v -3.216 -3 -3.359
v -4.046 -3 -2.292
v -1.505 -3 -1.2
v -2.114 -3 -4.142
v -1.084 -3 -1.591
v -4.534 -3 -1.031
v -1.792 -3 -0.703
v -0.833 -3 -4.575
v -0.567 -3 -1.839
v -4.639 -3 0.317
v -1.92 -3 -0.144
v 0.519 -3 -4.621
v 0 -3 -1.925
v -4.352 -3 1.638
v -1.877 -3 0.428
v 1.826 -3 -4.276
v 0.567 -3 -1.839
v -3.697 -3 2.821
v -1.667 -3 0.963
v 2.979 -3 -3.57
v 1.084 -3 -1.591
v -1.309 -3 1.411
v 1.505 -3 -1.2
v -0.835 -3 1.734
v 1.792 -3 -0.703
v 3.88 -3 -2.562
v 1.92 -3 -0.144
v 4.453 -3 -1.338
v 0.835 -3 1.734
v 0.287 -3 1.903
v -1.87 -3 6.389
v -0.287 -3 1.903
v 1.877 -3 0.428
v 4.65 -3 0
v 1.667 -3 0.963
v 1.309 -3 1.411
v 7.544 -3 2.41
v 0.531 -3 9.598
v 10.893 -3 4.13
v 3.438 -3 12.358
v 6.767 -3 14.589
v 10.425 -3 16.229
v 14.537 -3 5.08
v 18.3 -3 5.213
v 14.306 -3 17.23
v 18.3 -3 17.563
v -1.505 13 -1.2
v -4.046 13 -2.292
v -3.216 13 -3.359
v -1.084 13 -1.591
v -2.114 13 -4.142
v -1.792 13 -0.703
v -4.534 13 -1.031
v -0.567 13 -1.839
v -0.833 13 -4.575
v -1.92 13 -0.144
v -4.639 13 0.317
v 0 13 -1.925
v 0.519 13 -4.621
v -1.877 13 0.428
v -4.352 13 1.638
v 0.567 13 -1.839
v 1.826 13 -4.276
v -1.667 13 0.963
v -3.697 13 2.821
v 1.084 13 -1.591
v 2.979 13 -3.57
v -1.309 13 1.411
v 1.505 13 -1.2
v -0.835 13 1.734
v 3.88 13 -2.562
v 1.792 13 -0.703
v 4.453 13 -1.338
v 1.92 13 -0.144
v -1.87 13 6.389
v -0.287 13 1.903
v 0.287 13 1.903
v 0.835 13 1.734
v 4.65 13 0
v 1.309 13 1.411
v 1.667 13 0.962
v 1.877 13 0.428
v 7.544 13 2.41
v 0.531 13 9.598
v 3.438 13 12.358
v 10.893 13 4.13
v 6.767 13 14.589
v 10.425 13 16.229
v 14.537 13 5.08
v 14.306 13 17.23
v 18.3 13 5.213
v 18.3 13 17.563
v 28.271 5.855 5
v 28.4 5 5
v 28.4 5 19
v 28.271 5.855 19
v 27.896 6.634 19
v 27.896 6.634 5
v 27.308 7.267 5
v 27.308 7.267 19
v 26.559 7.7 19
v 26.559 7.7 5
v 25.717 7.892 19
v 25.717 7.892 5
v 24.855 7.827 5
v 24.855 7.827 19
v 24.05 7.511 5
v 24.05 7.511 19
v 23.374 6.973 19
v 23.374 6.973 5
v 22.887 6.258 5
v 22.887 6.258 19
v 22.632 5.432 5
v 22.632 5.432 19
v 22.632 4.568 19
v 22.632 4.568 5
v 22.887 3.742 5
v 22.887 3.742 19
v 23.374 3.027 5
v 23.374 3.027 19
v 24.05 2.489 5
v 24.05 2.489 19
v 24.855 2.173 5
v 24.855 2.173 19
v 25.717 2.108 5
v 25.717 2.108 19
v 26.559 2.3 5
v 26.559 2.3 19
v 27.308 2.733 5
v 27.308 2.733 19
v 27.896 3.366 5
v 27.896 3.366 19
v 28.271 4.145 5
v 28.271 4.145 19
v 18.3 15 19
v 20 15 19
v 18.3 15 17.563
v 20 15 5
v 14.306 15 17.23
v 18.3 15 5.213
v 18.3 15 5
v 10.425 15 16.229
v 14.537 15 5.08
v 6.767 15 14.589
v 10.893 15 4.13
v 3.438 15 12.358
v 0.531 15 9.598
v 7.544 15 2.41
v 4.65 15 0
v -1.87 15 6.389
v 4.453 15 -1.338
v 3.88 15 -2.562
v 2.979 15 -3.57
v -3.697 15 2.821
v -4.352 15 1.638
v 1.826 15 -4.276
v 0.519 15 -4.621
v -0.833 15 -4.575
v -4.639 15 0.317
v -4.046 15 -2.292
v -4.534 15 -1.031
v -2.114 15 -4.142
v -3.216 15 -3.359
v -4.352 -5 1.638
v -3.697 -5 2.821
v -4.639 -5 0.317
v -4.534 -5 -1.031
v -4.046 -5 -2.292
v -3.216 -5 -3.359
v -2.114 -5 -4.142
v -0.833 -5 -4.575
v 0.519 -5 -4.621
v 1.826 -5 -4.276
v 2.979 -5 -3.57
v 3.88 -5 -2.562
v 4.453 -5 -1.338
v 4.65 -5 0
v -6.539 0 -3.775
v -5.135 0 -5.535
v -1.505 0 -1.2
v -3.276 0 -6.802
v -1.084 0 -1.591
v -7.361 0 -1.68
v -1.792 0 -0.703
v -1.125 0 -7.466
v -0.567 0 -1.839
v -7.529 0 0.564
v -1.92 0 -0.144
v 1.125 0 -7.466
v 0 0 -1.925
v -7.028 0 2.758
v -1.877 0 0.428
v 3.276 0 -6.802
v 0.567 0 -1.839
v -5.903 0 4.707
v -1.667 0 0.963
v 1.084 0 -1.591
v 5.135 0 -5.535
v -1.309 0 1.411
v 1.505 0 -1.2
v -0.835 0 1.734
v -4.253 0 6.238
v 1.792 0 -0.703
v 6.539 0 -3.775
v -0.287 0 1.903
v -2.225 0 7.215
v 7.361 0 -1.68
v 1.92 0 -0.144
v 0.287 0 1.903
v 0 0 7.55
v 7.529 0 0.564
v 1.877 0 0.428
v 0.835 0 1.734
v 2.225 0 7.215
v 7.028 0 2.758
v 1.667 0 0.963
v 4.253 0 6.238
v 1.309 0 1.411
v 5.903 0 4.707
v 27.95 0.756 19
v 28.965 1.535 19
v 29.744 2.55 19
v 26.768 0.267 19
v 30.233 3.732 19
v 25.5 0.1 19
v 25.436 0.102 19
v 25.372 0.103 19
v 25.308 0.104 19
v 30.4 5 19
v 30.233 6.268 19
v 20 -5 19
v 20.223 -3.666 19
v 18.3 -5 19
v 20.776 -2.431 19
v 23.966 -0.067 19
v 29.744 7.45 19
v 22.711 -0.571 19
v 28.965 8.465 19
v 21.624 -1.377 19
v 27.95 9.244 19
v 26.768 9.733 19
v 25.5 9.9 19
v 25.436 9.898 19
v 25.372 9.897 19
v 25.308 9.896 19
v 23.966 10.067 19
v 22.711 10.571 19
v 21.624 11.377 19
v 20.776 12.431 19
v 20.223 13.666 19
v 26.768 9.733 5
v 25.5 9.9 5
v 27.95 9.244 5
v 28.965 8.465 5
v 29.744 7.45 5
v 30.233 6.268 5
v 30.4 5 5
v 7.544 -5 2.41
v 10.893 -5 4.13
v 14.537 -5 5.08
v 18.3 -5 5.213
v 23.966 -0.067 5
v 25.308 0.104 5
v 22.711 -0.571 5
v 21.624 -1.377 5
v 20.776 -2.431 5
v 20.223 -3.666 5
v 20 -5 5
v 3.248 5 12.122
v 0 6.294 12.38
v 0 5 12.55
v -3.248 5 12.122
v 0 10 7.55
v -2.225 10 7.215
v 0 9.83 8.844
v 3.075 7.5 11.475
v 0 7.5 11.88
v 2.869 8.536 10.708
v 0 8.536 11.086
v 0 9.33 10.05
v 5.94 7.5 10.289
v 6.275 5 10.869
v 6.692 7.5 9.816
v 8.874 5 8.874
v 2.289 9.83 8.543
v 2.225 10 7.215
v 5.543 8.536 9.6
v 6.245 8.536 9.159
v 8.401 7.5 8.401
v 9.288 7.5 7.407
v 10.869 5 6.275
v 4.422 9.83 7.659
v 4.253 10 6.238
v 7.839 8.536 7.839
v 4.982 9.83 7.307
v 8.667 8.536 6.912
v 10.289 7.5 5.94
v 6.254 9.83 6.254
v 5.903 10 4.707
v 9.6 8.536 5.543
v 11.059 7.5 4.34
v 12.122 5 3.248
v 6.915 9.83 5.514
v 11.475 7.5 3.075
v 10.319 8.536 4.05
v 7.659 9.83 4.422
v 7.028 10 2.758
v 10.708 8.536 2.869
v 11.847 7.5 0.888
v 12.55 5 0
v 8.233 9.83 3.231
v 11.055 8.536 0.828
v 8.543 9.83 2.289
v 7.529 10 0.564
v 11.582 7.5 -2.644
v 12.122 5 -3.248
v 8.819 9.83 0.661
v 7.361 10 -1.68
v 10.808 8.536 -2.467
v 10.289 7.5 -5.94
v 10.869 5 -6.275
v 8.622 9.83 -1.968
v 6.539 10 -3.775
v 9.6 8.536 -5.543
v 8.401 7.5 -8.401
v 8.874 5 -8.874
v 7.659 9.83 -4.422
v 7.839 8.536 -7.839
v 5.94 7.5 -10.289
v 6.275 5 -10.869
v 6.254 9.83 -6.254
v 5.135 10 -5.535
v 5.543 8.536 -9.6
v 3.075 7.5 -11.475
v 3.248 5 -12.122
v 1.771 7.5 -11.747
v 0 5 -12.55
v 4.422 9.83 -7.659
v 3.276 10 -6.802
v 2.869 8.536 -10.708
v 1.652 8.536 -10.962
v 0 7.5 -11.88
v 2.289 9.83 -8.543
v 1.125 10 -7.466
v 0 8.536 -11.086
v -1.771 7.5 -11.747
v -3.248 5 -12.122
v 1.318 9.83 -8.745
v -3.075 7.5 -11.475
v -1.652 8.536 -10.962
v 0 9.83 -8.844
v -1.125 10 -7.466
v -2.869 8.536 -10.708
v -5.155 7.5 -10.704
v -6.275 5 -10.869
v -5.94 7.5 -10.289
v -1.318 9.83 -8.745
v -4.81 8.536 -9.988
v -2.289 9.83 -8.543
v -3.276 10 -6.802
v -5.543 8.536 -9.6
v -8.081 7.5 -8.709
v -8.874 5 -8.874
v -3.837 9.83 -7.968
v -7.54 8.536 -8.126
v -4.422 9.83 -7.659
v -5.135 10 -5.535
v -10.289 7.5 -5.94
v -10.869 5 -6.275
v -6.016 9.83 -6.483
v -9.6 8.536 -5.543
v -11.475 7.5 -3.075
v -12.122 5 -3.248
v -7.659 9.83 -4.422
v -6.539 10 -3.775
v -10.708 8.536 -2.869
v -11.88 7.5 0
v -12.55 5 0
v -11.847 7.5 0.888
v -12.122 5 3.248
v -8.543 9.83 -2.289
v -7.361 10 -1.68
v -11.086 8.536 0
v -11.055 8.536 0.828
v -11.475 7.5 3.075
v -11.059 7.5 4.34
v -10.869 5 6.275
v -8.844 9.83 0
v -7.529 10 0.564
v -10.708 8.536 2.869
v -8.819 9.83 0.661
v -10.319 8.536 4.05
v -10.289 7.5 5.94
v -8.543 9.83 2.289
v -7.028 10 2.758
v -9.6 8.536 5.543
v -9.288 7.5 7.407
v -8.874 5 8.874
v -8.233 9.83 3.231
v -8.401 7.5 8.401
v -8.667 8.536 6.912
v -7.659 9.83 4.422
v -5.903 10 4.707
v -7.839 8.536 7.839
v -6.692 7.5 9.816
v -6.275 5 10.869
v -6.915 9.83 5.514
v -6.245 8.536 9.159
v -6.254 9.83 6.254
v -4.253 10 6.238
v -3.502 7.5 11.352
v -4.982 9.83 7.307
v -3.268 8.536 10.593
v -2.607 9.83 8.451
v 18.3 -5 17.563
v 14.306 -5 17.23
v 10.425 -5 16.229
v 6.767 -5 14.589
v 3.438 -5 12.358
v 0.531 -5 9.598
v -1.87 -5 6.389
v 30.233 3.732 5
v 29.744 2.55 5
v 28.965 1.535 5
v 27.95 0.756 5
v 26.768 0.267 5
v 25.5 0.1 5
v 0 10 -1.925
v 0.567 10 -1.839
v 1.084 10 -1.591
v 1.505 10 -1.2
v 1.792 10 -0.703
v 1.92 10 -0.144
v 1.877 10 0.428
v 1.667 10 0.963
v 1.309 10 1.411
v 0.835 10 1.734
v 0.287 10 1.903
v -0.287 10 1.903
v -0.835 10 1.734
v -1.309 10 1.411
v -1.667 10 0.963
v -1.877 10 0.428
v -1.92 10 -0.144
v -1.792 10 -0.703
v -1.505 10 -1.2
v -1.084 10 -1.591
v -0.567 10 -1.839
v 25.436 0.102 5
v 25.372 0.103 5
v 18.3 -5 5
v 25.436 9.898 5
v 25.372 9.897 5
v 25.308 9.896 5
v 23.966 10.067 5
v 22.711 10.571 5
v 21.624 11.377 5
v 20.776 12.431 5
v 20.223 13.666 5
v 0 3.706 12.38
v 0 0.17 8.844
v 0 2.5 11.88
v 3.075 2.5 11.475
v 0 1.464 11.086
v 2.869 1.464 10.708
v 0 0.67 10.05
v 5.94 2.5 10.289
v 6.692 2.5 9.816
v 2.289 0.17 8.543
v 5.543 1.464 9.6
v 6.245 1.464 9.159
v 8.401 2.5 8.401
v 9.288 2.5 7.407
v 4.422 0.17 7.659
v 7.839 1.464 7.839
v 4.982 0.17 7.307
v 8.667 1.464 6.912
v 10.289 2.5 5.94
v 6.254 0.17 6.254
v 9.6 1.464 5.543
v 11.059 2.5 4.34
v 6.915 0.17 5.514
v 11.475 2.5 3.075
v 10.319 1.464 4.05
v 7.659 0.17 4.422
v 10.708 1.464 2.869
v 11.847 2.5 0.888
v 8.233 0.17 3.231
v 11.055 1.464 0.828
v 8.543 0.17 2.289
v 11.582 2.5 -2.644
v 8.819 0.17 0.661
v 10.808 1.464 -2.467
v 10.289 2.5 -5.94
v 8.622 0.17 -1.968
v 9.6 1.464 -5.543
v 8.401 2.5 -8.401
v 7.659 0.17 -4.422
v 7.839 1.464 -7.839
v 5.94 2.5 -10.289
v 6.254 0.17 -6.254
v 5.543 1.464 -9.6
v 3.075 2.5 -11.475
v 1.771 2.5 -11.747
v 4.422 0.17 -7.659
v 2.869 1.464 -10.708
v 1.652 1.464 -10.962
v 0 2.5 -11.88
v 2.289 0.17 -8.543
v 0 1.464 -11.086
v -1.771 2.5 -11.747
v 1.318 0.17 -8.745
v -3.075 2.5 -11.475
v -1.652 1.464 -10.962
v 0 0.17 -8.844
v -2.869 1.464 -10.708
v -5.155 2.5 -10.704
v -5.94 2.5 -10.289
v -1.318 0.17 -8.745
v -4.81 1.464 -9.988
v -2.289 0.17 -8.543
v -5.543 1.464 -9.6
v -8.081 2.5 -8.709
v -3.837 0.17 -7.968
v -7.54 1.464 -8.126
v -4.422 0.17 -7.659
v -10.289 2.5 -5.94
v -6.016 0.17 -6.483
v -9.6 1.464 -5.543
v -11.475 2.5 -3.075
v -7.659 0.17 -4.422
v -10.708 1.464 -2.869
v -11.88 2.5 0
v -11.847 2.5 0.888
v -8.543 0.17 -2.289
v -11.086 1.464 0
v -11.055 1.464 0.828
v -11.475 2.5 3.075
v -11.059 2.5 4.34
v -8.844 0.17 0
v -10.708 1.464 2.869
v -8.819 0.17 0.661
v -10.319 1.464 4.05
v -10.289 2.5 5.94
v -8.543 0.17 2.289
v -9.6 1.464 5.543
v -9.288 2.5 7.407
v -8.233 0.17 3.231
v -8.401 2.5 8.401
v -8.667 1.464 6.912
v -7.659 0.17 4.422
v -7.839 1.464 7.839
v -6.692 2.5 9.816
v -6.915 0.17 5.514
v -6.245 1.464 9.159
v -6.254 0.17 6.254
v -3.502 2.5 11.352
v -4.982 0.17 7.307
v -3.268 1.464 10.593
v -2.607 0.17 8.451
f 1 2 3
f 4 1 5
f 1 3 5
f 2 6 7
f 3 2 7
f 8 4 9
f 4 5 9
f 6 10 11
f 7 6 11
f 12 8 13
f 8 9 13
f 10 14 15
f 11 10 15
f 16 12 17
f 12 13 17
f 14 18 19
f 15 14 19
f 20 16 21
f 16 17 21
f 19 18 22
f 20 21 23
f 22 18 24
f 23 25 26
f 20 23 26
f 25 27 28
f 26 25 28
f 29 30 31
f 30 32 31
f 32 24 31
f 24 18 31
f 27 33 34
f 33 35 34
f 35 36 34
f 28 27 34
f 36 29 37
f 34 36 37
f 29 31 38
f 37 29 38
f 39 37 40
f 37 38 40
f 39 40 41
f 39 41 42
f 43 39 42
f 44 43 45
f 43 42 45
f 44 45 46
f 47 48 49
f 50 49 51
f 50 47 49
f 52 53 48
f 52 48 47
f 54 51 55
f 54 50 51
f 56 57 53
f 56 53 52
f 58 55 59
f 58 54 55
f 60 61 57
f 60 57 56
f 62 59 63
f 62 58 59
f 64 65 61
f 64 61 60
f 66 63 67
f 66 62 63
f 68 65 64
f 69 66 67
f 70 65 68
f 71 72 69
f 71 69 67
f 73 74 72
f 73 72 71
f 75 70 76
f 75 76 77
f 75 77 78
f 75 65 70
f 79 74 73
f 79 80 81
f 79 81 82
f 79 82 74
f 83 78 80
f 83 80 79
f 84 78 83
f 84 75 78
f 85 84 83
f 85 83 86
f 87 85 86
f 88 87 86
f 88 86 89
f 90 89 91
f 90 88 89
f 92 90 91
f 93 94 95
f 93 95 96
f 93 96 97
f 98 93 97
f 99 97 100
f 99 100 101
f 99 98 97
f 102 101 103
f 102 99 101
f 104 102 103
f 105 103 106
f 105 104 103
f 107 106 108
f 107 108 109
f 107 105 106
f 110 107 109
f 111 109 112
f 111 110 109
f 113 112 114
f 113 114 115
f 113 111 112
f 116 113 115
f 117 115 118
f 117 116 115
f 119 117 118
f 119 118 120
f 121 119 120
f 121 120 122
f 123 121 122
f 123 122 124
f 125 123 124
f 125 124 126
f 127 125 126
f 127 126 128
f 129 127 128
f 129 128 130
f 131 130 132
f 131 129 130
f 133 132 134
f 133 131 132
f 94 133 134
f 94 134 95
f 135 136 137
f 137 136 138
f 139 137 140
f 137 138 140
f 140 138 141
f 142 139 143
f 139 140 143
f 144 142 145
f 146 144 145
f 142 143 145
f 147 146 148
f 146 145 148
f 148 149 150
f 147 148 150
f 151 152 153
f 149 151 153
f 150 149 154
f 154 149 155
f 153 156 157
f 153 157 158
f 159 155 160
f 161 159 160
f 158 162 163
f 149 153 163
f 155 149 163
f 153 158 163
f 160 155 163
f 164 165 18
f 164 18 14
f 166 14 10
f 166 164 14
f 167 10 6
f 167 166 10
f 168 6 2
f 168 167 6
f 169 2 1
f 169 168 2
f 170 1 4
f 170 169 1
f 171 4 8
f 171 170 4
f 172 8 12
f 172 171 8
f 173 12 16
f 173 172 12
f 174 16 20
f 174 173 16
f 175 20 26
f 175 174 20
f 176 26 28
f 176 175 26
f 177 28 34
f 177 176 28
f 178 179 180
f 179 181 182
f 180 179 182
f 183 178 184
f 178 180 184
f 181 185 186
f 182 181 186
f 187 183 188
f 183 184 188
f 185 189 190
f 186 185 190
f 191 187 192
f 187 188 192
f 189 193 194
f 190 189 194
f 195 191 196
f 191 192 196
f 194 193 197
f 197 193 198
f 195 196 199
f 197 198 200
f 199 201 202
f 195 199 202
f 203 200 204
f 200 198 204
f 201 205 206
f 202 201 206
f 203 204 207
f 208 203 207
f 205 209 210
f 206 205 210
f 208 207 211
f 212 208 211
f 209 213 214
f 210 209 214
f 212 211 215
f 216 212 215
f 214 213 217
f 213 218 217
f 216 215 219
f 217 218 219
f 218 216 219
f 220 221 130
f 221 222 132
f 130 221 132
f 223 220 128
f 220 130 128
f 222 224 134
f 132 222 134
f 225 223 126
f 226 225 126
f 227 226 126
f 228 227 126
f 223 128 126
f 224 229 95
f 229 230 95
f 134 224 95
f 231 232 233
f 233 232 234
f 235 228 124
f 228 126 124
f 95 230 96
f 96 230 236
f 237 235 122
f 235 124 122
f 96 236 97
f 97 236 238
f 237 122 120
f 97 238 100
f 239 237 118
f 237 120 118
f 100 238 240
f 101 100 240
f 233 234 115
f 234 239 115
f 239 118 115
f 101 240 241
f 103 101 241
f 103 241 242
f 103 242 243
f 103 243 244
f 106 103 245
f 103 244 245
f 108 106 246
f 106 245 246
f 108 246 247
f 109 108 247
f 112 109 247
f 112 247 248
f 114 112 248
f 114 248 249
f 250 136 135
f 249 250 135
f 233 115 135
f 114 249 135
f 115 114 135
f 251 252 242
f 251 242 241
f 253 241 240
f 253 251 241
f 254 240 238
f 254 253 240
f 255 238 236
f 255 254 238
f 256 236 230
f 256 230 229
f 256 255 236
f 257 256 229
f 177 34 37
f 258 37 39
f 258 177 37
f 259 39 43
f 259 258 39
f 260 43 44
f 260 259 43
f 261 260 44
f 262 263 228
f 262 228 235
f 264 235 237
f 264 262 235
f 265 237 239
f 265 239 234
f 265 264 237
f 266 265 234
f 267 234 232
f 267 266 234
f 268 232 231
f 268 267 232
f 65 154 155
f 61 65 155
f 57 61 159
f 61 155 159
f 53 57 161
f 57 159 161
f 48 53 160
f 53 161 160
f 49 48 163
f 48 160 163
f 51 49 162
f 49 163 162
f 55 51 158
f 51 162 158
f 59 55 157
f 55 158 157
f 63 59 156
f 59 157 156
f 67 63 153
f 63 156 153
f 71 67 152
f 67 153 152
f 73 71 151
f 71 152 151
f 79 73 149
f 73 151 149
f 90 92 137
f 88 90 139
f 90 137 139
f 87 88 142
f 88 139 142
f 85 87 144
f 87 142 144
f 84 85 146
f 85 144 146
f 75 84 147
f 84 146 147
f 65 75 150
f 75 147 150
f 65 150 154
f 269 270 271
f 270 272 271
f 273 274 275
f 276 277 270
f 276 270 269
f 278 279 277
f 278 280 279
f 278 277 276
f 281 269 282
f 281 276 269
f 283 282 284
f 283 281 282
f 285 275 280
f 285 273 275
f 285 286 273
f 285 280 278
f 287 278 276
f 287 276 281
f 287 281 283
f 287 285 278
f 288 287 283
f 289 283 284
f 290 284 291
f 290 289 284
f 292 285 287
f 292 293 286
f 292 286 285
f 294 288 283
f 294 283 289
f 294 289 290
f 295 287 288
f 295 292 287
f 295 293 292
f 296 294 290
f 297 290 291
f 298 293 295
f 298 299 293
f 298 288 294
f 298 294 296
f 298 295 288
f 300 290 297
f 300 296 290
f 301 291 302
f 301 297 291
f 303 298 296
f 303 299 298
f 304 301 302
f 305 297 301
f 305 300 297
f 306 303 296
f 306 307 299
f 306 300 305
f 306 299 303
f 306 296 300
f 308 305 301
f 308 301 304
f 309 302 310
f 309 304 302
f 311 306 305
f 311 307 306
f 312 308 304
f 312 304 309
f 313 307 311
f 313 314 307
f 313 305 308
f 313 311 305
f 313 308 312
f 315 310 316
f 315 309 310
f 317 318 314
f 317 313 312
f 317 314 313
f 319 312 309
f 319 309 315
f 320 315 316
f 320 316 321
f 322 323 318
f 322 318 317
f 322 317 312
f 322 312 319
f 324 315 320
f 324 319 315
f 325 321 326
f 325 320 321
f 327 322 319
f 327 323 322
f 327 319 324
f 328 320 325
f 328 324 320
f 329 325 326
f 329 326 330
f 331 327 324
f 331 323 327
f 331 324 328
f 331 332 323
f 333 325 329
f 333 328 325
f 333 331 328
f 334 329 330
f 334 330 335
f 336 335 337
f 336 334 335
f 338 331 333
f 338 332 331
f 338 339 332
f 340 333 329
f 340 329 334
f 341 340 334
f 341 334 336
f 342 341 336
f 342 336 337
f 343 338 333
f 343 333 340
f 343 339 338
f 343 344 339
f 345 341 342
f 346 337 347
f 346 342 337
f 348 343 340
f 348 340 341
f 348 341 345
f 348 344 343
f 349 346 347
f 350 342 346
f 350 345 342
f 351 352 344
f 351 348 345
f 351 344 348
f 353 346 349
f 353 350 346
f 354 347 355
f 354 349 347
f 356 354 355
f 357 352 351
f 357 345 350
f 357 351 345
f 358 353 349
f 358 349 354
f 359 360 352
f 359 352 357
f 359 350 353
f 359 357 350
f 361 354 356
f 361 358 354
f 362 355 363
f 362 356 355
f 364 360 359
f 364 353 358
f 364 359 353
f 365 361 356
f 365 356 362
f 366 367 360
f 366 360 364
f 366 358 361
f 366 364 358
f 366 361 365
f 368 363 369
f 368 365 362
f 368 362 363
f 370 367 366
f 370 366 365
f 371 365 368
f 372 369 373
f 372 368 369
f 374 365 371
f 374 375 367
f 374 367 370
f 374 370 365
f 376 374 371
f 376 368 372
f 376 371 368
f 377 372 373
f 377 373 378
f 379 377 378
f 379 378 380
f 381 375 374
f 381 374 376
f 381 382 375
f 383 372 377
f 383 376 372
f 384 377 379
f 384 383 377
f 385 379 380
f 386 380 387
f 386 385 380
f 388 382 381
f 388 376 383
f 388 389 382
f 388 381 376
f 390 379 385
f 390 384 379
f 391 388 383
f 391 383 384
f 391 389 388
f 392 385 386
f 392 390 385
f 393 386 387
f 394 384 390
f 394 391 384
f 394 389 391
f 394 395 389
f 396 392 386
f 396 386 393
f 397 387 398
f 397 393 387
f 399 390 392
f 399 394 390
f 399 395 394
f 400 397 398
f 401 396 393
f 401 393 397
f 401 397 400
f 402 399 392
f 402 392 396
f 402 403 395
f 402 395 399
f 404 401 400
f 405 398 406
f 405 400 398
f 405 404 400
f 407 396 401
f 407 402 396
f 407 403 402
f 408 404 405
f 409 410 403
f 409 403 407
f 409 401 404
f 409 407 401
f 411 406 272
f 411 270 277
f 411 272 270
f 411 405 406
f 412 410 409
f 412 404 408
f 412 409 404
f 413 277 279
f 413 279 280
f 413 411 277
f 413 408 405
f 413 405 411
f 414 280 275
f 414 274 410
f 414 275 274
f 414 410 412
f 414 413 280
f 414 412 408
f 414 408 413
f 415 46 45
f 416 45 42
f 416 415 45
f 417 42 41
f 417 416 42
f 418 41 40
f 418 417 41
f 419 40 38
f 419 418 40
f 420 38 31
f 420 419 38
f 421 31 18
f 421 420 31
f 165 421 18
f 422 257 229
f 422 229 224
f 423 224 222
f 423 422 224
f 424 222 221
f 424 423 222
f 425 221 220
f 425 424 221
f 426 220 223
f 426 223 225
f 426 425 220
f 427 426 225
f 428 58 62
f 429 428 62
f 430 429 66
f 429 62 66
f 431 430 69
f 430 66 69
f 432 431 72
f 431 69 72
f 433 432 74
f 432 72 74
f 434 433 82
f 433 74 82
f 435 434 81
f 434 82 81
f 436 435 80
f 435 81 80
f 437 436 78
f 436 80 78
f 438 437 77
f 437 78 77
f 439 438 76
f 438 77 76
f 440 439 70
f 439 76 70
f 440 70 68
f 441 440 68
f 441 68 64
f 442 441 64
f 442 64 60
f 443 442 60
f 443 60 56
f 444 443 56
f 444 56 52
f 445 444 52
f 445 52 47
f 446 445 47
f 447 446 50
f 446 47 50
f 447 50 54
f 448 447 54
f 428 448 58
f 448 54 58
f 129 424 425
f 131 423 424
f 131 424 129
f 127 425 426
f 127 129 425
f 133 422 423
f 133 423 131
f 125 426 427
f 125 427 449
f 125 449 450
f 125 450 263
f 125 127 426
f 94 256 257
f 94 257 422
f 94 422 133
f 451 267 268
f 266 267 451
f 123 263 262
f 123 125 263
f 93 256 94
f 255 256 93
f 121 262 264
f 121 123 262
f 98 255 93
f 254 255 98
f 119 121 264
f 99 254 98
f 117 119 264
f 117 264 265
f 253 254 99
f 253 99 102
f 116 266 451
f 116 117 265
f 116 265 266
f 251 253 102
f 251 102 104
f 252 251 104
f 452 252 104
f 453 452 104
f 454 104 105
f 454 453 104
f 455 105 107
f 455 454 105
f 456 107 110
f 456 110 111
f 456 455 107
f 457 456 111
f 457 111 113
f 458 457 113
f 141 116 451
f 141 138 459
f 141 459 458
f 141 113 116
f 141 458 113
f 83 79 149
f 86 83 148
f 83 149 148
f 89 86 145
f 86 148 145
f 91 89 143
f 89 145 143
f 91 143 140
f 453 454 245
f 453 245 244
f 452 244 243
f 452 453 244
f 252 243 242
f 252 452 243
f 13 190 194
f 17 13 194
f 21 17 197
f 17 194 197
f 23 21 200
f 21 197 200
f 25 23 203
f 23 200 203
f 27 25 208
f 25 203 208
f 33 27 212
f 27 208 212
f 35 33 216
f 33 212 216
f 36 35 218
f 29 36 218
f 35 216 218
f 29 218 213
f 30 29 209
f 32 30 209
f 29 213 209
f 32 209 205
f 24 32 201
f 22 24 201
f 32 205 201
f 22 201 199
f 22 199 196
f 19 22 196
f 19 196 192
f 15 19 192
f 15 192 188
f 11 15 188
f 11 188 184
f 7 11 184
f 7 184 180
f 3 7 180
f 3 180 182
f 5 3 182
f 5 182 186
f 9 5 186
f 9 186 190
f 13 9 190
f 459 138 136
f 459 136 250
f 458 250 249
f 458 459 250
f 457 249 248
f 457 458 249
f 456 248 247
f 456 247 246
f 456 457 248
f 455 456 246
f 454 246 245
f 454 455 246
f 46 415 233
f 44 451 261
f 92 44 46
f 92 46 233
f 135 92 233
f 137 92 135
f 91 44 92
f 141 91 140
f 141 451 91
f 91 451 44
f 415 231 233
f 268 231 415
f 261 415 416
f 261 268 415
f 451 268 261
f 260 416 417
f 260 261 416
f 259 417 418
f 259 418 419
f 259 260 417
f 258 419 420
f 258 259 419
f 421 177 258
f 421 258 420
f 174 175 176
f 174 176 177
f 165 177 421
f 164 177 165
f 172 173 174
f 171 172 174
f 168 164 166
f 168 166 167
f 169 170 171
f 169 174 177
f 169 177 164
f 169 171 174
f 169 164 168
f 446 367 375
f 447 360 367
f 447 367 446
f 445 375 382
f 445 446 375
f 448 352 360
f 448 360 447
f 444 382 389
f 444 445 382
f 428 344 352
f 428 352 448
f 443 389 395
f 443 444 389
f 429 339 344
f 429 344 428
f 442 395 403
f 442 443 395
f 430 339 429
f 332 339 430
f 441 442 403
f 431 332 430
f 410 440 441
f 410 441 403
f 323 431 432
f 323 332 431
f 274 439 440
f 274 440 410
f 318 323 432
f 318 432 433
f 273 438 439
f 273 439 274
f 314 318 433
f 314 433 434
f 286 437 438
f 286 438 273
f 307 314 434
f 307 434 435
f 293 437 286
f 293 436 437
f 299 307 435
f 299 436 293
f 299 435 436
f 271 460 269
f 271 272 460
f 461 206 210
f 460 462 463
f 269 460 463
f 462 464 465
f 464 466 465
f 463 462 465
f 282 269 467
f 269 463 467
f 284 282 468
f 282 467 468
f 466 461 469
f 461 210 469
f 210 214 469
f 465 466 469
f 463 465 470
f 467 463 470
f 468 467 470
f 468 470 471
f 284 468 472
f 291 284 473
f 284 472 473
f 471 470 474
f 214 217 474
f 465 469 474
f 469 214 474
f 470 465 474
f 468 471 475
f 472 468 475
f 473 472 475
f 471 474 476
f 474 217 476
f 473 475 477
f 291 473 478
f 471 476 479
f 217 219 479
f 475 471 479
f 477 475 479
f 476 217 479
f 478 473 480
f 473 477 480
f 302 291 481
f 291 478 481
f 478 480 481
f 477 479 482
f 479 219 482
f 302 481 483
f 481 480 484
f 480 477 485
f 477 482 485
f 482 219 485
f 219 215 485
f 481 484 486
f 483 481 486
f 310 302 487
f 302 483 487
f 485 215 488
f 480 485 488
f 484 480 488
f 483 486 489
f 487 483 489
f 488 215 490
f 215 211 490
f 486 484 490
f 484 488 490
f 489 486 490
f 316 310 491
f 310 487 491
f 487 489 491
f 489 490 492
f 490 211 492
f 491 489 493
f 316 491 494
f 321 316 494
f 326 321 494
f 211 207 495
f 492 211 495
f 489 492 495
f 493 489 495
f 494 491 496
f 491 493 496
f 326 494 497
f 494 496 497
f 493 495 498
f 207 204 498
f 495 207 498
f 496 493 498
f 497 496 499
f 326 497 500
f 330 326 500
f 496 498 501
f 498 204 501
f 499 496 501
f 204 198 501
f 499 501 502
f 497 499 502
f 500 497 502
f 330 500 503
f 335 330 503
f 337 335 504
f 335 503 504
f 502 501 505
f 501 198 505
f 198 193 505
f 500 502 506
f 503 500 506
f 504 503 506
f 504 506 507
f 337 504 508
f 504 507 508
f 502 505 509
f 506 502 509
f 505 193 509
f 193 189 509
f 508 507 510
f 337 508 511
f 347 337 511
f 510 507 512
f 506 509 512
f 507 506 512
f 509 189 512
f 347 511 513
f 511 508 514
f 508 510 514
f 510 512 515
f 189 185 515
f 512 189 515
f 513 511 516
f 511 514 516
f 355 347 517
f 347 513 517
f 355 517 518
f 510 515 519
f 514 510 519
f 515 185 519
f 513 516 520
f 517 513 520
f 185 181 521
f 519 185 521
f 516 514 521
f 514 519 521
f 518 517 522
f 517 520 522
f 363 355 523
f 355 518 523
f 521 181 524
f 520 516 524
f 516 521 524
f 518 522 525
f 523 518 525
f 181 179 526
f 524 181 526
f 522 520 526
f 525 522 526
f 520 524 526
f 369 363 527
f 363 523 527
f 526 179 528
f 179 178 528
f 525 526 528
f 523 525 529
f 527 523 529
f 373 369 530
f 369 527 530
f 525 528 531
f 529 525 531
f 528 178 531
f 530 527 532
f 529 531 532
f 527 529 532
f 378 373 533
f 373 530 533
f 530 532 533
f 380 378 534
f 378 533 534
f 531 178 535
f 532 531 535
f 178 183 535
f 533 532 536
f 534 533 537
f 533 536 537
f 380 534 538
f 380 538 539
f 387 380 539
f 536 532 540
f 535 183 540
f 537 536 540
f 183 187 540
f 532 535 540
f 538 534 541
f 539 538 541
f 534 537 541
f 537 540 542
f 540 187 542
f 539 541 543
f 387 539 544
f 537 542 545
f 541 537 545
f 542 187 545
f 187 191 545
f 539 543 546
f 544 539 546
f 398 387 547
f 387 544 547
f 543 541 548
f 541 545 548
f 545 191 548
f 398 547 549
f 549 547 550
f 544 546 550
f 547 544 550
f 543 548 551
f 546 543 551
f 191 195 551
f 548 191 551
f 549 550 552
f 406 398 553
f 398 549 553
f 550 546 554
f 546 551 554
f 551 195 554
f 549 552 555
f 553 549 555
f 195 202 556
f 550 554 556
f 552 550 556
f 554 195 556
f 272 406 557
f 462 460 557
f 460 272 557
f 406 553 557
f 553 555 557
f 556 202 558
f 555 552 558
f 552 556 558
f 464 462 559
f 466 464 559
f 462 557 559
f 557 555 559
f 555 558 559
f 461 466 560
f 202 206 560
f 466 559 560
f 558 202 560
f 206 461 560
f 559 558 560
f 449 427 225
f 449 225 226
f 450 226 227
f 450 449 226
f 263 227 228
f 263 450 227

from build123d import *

# Parameters (mm, degrees)
SKETCH1_R                = 12.55
SKETCH1_R_2              = 1.925
BOSS_EXTRUDE1_DEPTH      = 10
FILLET1_R                = 5
BOSS_EXTRUDE2_DEPTH      = 5
BOSS_EXTRUDE2_DEPTH_BACK = 15
SKETCH2_R                = 1.925
SKETCH3_R                = 1.925
BOSS_EXTRUDE3_DEPTH      = 2
BOSS_EXTRUDE4_START      = -20
BOSS_EXTRUDE4_OUTLINE_R  = 1.925
BOSS_EXTRUDE4_DEPTH      = 2
SKETCH4_W                = 12.5
SKETCH4_H                = 20
BOSS_EXTRUDE5_DEPTH      = 1.7
SKETCH5_W                = 1.7
SKETCH5_H                = 10
BOSS_EXTRUDE6_DEPTH      = 14


# Read off the part's stored shape, not the designer's step: Boss-Extrude4
with BuildPart() as part:
    # Sketch1 → Boss-Extrude1 (new body)
    with BuildSketch(Plane(origin=(0, 0, 0), x_dir=(1, 0, 0), z_dir=(0, 1, 0))):
        with Locations(Location((0, 0, 0), (0, 0, 270))):
            Circle(SKETCH1_R)
        with Locations(Location((0, 0, 0), (0, 0, 270))):
            Circle(SKETCH1_R_2, mode=Mode.SUBTRACT)
    extrude(amount=BOSS_EXTRUDE1_DEPTH)

    # Fillet1
    fillet1_edges = [part.edges().sort_by_distance(p)[0] for p in [
        (0, 0, -12.55),
        (0, 10, -12.55),
    ]]
    fillet(fillet1_edges, radius=FILLET1_R - 0.0001)  # a hair under: the kernel refuses the full size

    # Sketch2 → Boss-Extrude2 (add, two sides: drawn at the far end of the back side and taken through both)
    with BuildSketch(Plane.XZ.offset(-BOSS_EXTRUDE2_DEPTH_BACK)):
        with Locations(Location((0, 0, 0), (0, 0, 270))):
            Circle(SKETCH2_R)
    extrude(amount=BOSS_EXTRUDE2_DEPTH + BOSS_EXTRUDE2_DEPTH_BACK)

    # Sketch3 → Boss-Extrude3 (add)
    with BuildSketch(Plane.XZ.offset(5)):
        with BuildLine():
            Line((20, 5), (20, 17.5))
            ThreePointArc((20, 17.5), (5.770309443, 14.004874621), (-3.696538076, 2.821011566))
            ThreePointArc((-3.696538076, 2.821011566), (-1.488891861, -4.405190237), (4.65, 0))
            ThreePointArc((4.65, 0), (11.70086168, 4.416104641), (20, 5))
        make_face()
        with Locations(Location((0, 0, 0), (0, 0, 270))):
            Circle(SKETCH3_R, mode=Mode.SUBTRACT)
    extrude(amount=-BOSS_EXTRUDE3_DEPTH)

    # Boss-Extrude4 outline → Boss-Extrude4 (add)
    with BuildSketch(Plane.XZ.offset(5).offset(BOSS_EXTRUDE4_START)):
        with BuildLine():
            ThreePointArc((-3.696538076, 2.821011566), (-1.488891861, -4.405190237), (4.65, 0))
            ThreePointArc((4.65, 0), (11.70086168, 4.416104641), (20, 5))
            Line((20, 5), (20, 17.5))
            ThreePointArc((20, 17.5), (5.770309443, 14.004874621), (-3.696538076, 2.821011566))
        make_face()
        Circle(BOSS_EXTRUDE4_OUTLINE_R, mode=Mode.SUBTRACT)
    extrude(amount=BOSS_EXTRUDE4_DEPTH)

    # Sketch4 → Boss-Extrude5 (add)
    with BuildSketch(Plane(origin=(20, 0, 0), x_dir=(0, 0, -1), z_dir=(1, 0, 0))):
        with Locations((-11.25, 5)):
            Rectangle(SKETCH4_W, SKETCH4_H)
    extrude(amount=-BOSS_EXTRUDE5_DEPTH)

    # Sketch5 → Boss-Extrude6 (add)
    with BuildSketch(Plane(origin=(0, 0, 5), x_dir=(-1, 0, 0), z_dir=(0, 0, -1))):
        with BuildLine():
            ThreePointArc((-25.307916987, 9.896233666), (-21.967917982, 8.39623271), (-20.6, 5))
            Line((-20.6, 5), (-20, 5))
            Line((-20, 5), (-20, 15))
            ThreePointArc((-20, 15), (-21.62390923, 11.376865599), (-25.307916987, 9.896233666))
        make_face()
        with BuildLine():
            Line((-20, 5), (-20.6, 5))
            ThreePointArc((-20.6, 5), (-21.967917982, 1.60376729), (-25.307916987, 0.103766334))
            ThreePointArc((-25.307916987, 0.103766334), (-21.62390923, -1.376865599), (-20, -5))
            Line((-20, -5), (-20, 5))
        make_face()
        with BuildLine():
            ThreePointArc((-25.307916987, 0.103766334), (-21.967917982, 1.60376729), (-20.6, 5))
            Line((-20.6, 5), (-22.6, 5))
            ThreePointArc((-22.6, 5), (-25.5, 2.1), (-28.4, 5))
            Line((-28.4, 5), (-30.4, 5))
            ThreePointArc((-30.4, 5), (-28.964823228, 1.535176772), (-25.5, 0.1))
            ThreePointArc((-25.5, 0.1), (-25.403975548, 0.102752972), (-25.307916987, 0.103766334))
        make_face()
        with BuildLine():
            Line((-22.6, 5), (-20.6, 5))
            ThreePointArc((-20.6, 5), (-21.967917982, 8.39623271), (-25.307916987, 9.896233666))
            ThreePointArc((-25.307916987, 9.896233666), (-25.403975548, 9.897247028), (-25.5, 9.9))
            ThreePointArc((-25.5, 9.9), (-28.964823228, 8.464823228), (-30.4, 5))
            Line((-30.4, 5), (-28.4, 5))
            ThreePointArc((-28.4, 5), (-25.5, 7.9), (-22.6, 5))
        make_face()
        with Locations((-19.15, 0)):
            Rectangle(SKETCH5_W, SKETCH5_H)
        with Locations((-19.15, 10)):
            Rectangle(SKETCH5_W, SKETCH5_H)
    extrude(amount=-BOSS_EXTRUDE6_DEPTH)


solid = part.part
